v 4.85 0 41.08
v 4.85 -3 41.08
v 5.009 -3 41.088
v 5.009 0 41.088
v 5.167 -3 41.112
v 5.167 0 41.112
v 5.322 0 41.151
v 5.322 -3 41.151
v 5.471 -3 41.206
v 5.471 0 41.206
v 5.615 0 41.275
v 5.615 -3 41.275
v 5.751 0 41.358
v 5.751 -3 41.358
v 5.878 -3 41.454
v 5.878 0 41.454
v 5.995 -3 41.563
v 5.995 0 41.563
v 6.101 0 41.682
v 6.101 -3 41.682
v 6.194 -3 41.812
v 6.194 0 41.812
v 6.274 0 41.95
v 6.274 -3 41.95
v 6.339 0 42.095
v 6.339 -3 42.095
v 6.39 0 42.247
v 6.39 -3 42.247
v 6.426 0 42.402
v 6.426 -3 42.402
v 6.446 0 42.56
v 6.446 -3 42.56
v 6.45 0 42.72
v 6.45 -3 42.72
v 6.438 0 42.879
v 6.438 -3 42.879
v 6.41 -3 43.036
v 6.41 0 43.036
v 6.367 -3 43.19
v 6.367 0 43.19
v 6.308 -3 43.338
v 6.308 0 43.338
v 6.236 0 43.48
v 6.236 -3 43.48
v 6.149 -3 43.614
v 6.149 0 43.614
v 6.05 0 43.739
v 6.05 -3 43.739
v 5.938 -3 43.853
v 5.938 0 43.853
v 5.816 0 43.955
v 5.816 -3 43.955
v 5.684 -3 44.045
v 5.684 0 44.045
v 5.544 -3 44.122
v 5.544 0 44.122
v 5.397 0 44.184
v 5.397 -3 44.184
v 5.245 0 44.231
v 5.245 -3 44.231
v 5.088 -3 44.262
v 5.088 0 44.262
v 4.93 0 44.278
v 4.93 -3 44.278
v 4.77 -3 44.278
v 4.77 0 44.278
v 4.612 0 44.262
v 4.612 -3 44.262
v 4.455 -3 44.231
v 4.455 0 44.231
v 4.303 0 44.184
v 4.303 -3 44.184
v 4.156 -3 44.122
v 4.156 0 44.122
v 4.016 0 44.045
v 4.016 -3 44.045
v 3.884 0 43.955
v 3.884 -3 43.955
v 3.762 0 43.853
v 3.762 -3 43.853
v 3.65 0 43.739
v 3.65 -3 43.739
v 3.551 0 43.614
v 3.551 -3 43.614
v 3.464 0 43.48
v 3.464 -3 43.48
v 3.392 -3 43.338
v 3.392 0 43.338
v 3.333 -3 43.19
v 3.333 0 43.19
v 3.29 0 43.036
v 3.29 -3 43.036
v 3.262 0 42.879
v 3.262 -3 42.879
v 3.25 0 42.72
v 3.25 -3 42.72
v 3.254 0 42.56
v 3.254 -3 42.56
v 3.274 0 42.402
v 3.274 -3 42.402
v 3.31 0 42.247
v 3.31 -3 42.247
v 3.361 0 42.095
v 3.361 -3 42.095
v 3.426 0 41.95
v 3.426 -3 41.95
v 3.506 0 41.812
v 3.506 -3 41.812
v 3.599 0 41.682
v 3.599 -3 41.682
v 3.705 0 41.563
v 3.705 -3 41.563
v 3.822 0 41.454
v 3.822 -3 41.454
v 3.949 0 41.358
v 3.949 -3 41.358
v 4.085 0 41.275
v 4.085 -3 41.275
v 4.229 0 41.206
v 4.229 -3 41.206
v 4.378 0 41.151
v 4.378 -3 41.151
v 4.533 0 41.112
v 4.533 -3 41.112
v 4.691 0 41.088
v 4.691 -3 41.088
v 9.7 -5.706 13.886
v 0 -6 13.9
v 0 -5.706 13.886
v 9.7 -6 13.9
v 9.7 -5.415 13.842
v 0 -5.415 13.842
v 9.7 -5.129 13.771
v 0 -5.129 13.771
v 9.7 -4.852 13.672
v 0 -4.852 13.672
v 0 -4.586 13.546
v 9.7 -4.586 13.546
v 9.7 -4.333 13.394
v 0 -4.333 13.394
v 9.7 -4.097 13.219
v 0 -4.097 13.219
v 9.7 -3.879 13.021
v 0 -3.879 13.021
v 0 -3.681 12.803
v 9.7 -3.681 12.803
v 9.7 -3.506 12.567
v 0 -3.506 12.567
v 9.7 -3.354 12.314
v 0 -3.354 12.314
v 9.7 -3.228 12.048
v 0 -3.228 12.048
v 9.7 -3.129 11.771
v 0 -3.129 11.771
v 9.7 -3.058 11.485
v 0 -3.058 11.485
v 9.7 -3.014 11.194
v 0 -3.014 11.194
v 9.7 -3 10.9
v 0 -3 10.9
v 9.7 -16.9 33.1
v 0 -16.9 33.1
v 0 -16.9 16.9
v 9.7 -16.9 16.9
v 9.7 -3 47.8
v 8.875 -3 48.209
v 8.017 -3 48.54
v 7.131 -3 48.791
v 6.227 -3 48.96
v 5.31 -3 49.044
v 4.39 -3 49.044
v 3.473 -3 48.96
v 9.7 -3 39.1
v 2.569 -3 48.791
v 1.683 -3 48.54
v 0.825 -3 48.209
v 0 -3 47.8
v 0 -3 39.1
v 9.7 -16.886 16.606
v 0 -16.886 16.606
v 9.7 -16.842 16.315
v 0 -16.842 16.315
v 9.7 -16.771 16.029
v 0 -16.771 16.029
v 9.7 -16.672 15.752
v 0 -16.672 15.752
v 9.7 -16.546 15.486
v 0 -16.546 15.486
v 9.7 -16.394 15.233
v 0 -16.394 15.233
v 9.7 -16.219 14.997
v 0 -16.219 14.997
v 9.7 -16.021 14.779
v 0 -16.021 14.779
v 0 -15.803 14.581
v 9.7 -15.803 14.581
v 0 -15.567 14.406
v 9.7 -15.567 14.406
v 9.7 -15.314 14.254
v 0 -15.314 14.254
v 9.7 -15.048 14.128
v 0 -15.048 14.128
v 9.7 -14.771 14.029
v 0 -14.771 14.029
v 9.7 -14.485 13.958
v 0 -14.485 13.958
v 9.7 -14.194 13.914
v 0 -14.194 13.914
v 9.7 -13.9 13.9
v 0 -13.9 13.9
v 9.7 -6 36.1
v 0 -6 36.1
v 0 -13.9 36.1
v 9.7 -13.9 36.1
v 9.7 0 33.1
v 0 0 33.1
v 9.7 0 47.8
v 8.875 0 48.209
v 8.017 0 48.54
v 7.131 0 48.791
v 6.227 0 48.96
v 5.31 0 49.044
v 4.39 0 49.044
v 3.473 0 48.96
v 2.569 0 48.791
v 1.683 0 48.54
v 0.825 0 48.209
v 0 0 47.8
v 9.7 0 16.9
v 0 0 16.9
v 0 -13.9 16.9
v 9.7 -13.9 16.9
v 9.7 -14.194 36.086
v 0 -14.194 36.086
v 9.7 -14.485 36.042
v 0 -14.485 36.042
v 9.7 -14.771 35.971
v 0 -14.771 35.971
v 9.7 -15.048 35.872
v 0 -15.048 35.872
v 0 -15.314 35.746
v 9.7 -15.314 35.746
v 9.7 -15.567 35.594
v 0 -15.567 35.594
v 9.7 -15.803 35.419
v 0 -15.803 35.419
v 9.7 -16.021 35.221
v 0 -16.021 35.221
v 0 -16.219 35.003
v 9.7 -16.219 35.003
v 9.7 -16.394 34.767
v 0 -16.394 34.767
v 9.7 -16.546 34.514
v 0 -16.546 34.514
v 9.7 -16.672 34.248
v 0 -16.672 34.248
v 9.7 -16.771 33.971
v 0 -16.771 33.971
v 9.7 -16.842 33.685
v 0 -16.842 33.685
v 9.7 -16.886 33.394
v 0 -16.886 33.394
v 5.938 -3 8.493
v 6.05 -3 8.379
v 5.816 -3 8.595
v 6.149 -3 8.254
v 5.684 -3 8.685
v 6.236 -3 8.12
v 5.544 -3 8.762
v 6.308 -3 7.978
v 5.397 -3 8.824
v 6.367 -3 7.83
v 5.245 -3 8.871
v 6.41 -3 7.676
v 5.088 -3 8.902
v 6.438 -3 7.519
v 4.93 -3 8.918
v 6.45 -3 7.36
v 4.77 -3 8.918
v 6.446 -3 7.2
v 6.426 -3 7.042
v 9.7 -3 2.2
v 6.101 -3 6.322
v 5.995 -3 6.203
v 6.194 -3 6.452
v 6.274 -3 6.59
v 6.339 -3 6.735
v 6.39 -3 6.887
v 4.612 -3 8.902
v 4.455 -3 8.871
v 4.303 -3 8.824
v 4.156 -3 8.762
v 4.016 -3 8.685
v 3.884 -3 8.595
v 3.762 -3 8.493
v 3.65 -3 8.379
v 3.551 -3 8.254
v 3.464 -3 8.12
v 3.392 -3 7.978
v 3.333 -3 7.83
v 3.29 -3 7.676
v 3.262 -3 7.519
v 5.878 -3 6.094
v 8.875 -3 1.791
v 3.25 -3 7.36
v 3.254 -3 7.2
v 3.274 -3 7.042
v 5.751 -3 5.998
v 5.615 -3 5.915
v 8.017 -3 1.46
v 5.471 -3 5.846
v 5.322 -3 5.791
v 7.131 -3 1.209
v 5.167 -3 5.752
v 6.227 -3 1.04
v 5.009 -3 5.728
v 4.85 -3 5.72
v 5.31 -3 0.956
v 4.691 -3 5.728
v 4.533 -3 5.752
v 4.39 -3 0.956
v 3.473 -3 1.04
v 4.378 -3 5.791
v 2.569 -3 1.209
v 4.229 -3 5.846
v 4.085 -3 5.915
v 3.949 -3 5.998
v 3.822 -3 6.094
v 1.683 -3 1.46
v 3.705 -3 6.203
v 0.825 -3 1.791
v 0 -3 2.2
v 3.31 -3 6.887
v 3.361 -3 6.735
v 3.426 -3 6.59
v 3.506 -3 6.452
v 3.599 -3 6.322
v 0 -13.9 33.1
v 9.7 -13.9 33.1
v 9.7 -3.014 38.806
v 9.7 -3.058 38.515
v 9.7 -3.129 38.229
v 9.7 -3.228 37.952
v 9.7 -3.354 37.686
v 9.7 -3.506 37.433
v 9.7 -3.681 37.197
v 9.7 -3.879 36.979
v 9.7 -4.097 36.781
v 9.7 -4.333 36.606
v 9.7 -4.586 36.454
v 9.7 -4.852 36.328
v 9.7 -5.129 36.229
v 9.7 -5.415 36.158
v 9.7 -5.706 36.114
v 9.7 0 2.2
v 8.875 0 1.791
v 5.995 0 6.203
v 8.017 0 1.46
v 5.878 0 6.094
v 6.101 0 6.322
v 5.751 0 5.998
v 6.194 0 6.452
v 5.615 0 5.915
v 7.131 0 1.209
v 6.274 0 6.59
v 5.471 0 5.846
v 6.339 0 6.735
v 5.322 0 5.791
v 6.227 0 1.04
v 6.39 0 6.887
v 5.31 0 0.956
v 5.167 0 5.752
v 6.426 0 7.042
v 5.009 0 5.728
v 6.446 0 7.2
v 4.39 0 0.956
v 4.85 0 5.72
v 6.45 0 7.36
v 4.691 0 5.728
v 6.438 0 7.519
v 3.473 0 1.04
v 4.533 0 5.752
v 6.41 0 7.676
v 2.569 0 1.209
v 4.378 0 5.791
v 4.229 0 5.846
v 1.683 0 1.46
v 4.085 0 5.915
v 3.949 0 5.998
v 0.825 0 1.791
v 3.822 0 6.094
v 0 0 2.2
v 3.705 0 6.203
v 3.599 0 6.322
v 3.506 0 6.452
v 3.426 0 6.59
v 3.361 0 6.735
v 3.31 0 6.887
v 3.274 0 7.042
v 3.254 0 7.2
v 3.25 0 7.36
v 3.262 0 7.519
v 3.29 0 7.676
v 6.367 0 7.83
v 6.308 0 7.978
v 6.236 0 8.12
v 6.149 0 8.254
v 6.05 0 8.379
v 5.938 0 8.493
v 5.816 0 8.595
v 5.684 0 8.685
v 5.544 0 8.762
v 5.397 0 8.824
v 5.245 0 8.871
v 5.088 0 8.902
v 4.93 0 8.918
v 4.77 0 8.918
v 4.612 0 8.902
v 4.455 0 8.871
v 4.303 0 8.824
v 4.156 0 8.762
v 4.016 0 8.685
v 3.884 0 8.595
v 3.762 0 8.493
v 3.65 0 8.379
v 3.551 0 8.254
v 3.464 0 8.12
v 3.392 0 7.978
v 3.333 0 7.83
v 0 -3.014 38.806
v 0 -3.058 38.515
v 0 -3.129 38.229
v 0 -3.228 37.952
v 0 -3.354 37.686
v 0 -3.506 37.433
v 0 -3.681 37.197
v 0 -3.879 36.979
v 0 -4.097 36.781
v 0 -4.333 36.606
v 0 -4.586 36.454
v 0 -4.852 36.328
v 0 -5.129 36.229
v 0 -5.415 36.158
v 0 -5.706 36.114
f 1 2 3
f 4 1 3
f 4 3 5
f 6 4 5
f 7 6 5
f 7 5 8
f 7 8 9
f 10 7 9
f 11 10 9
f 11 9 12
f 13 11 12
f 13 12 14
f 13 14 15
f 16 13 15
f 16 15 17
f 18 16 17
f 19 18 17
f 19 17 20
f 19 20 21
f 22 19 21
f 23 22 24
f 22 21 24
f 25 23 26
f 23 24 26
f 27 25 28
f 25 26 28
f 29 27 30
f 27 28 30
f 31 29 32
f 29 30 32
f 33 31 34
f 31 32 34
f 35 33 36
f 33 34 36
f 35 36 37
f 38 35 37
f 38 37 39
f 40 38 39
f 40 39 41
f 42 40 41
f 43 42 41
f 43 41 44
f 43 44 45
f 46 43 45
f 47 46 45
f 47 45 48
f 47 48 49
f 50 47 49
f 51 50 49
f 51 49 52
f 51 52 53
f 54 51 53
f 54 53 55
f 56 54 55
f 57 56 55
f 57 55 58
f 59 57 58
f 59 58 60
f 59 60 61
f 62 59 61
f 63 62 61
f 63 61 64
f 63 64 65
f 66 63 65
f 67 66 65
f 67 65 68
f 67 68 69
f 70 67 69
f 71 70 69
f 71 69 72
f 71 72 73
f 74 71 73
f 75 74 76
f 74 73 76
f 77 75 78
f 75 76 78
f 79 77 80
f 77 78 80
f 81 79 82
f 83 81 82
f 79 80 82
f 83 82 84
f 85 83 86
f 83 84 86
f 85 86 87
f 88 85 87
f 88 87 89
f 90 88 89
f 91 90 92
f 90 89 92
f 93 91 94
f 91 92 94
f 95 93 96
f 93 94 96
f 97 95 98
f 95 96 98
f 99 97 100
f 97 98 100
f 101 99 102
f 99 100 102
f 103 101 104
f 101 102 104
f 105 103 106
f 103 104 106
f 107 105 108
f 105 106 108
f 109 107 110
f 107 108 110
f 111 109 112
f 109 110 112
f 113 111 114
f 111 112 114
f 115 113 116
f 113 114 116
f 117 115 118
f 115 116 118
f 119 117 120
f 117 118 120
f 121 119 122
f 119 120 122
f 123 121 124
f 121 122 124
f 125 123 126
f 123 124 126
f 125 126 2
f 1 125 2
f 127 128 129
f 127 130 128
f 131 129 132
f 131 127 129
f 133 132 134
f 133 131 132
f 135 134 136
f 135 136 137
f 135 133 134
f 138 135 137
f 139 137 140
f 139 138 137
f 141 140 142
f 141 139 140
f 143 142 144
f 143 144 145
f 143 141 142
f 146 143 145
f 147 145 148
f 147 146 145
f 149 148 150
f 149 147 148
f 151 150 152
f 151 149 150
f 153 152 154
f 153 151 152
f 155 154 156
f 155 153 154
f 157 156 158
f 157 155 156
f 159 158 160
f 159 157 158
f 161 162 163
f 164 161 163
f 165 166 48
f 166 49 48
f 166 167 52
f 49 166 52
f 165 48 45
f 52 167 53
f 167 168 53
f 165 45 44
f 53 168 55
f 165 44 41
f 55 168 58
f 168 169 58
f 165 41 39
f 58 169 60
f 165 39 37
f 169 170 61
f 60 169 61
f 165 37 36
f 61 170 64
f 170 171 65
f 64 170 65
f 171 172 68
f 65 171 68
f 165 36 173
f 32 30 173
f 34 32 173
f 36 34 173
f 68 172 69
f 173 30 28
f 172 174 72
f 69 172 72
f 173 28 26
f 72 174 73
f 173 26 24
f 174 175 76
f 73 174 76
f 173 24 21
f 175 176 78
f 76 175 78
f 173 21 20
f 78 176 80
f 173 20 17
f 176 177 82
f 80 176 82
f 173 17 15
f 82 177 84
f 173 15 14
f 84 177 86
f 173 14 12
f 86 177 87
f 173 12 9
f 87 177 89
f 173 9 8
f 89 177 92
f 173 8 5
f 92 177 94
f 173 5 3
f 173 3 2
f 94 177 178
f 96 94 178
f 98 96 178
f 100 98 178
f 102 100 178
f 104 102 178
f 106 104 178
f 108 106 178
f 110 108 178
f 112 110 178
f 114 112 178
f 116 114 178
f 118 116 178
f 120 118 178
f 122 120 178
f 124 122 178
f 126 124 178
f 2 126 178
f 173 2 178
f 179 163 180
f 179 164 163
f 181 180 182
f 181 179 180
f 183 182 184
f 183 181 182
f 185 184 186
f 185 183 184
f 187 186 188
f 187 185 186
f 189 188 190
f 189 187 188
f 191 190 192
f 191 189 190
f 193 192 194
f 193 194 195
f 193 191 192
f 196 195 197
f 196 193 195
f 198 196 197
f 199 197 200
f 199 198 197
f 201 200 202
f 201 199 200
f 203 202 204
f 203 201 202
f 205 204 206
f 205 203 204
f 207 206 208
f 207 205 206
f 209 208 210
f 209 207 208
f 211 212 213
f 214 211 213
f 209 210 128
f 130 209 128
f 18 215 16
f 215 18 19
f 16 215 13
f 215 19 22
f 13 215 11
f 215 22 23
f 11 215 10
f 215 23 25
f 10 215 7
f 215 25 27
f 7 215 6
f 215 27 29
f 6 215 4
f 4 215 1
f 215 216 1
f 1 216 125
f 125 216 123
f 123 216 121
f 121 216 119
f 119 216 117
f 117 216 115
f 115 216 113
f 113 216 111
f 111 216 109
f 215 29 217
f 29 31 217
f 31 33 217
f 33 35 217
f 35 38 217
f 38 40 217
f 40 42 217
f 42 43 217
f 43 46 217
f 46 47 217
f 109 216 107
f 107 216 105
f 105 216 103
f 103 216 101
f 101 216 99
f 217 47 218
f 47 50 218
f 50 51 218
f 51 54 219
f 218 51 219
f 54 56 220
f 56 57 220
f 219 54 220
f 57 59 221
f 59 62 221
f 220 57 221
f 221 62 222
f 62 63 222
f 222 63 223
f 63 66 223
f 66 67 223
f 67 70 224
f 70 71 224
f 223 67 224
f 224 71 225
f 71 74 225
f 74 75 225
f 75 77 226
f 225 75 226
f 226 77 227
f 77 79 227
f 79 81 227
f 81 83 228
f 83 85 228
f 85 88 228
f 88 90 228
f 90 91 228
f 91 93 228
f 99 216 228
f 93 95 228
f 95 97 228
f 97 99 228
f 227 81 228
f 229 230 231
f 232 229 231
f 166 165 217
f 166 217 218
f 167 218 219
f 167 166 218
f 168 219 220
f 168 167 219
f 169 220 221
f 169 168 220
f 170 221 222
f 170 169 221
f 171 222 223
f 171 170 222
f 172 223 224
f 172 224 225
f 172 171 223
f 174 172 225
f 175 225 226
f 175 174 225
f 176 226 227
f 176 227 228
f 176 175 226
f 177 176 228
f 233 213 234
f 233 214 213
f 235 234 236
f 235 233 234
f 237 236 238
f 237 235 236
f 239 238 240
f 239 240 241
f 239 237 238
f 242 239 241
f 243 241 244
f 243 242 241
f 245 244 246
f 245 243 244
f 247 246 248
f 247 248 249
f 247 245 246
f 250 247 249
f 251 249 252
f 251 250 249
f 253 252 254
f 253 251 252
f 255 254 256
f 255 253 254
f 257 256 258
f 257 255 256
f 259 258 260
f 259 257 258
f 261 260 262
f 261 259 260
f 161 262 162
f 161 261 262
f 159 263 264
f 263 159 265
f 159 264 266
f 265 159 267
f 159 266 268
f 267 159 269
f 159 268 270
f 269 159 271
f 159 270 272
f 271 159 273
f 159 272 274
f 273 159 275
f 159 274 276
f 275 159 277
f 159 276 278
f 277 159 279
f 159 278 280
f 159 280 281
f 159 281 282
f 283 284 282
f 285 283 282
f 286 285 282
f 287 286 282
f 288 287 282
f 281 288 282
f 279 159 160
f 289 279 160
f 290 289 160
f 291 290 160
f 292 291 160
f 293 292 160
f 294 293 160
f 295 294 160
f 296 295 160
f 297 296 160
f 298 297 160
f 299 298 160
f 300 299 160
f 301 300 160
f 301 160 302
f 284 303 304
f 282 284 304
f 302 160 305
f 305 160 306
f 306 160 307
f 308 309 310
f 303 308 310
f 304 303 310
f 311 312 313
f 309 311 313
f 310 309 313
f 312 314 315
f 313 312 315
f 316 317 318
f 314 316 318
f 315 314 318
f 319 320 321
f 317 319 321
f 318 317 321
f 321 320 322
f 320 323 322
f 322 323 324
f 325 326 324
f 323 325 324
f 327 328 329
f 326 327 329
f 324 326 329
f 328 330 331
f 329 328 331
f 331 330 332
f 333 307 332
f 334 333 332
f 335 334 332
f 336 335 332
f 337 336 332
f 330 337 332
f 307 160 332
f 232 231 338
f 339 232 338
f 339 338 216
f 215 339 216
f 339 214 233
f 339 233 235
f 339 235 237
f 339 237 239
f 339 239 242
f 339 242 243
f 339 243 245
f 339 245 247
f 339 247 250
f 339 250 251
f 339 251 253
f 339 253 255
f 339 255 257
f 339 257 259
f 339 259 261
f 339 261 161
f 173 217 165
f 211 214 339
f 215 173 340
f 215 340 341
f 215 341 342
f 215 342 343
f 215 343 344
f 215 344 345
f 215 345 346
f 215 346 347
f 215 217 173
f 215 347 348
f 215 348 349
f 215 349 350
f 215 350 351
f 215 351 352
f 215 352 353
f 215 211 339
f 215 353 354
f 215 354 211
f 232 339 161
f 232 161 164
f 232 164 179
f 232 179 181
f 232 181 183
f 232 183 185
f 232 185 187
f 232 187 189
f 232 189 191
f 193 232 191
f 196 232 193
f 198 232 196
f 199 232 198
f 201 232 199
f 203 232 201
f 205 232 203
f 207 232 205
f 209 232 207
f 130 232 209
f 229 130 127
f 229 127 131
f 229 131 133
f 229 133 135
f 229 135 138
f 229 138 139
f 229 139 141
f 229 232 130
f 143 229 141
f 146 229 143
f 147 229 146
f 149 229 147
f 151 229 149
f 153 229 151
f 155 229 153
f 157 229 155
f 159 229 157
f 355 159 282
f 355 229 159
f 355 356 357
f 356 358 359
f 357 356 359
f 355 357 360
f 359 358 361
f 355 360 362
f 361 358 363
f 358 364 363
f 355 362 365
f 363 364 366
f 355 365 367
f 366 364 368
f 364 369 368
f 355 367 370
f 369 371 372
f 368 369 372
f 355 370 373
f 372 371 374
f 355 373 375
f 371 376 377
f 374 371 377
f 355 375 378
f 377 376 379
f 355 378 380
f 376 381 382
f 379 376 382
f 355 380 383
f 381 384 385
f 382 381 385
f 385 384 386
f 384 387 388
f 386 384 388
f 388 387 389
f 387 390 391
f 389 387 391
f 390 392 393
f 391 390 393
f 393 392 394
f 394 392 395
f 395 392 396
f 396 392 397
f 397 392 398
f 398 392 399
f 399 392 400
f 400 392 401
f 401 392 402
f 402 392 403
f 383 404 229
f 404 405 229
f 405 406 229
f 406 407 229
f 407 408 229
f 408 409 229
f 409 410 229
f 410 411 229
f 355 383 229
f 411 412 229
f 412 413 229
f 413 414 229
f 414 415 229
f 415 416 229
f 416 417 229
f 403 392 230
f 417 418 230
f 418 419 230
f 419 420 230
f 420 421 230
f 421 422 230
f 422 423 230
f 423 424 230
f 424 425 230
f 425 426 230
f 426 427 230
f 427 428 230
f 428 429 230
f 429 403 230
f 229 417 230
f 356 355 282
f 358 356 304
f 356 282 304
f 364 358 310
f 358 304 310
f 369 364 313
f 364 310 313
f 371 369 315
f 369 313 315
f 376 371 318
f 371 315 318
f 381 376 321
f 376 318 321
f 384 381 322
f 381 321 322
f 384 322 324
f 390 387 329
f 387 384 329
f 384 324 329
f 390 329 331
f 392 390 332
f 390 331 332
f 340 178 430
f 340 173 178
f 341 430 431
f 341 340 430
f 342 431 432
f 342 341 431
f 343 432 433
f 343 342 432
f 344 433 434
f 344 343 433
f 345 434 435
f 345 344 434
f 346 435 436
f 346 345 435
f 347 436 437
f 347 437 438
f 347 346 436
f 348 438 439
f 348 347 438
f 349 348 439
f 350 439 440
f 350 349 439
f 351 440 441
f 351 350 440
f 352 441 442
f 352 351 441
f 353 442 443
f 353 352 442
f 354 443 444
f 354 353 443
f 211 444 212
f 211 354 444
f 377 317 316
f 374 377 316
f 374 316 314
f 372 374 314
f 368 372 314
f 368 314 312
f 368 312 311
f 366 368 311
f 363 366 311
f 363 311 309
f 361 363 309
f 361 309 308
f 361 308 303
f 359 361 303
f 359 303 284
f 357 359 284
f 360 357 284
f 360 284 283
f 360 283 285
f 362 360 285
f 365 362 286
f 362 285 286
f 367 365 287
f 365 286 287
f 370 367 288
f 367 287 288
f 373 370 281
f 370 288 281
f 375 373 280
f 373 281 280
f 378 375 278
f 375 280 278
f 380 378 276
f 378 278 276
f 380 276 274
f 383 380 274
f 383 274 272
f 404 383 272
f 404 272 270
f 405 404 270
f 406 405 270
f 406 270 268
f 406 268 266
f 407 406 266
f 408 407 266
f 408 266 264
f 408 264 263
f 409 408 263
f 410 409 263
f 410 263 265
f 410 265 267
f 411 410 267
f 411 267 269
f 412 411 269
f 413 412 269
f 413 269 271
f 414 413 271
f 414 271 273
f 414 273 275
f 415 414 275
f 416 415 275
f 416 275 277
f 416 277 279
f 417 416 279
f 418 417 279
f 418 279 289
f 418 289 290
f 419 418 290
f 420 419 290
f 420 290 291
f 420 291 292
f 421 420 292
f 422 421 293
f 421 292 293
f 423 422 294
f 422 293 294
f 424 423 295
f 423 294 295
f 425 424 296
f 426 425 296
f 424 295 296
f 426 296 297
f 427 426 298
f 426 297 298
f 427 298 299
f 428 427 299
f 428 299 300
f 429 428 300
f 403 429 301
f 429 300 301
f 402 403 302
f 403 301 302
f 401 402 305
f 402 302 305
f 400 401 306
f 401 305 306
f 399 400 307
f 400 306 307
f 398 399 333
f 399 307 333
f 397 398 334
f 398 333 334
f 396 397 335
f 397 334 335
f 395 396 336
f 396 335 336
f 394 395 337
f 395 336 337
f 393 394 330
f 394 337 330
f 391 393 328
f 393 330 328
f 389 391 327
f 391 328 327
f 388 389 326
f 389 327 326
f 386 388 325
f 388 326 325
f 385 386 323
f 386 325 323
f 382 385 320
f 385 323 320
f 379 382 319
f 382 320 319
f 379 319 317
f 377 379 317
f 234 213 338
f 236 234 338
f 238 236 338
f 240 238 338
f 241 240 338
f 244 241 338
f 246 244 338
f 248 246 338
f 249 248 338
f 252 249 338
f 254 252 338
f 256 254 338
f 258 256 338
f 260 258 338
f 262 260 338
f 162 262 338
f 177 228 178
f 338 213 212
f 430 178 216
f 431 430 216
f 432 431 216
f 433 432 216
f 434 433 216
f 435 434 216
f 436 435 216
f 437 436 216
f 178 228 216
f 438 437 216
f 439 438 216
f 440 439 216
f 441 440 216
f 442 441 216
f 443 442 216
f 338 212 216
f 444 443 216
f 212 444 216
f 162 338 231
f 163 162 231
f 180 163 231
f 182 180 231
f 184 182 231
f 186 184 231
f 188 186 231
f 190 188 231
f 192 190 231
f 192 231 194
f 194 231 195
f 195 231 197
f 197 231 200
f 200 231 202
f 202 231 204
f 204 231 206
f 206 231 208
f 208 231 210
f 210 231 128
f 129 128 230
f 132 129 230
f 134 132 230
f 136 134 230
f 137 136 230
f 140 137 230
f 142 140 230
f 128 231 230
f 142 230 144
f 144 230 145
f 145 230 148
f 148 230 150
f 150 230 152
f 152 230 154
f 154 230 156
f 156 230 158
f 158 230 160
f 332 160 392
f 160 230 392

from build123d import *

# Parameters (mm, degrees)
BOSS_EXTRUDE1_DEPTH = 9.7
FILLET3_R           = 3
SKETCH2_R           = 1.6
CUT_EXTRUDE1_DEPTH  = 9.7
CUT_EXTRUDE2_DEPTH  = 9.7


with BuildPart() as part:
    # Sketch1 → Boss-Extrude1 (new body)
    with BuildSketch(Plane(origin=(0, 0, 0), x_dir=(0, 0, -1), z_dir=(1, 0, 0))):
        Polygon((0, 0), (-16.9, 0), (-16.9, -13.9), (-33.1, -13.9), (-33.1, 0), (-50, 0), (-50, -3), (-36.1, -3), (-36.1, -16.9), (-13.9, -16.9), (-13.9, -3), (0, -3), align=None)
    extrude(amount=BOSS_EXTRUDE1_DEPTH)

    # Fillet3
    fillet3_edges = [part.edges().sort_by_distance(p)[0] for p in [
        (4.85, -3, 13.9),
        (4.85, -16.9, 13.9),
        (4.85, -16.9, 36.1),
        (4.85, -3, 36.1),
    ]]
    fillet(fillet3_edges, radius=FILLET3_R)

    # Sketch2 → Cut-Extrude1 (cut)
    with BuildSketch(Plane.XZ.offset(3)):
        with Locations(Location((4.85, 42.68, 0), (0, 0, 270))):
            Circle(SKETCH2_R)
        with Locations(Location((4.85, 7.32, 0), (0, 0, 270))):
            Circle(SKETCH2_R)
    extrude(amount=-CUT_EXTRUDE1_DEPTH, mode=Mode.SUBTRACT)

    # Sketch3 → Cut-Extrude2 (cut)
    with BuildSketch(Plane.XZ.offset(3)):
        with BuildLine():
            Line((0, 0), (9.7, 0))
            Line((9.7, 0), (9.7, 2.2))
            ThreePointArc((9.7, 2.2), (4.85, 0.945141508), (0, 2.2))
            Line((0, 2.2), (0, 0))
        make_face()
        with BuildLine():
            Line((0, 47.8), (0, 50))
            Line((0, 50), (9.7, 50))
            Line((9.7, 50), (9.7, 47.8))
            ThreePointArc((9.7, 47.8), (4.85, 49.054858492), (0, 47.8))
        make_face()
    extrude(amount=-CUT_EXTRUDE2_DEPTH, mode=Mode.SUBTRACT)


solid = part.part
